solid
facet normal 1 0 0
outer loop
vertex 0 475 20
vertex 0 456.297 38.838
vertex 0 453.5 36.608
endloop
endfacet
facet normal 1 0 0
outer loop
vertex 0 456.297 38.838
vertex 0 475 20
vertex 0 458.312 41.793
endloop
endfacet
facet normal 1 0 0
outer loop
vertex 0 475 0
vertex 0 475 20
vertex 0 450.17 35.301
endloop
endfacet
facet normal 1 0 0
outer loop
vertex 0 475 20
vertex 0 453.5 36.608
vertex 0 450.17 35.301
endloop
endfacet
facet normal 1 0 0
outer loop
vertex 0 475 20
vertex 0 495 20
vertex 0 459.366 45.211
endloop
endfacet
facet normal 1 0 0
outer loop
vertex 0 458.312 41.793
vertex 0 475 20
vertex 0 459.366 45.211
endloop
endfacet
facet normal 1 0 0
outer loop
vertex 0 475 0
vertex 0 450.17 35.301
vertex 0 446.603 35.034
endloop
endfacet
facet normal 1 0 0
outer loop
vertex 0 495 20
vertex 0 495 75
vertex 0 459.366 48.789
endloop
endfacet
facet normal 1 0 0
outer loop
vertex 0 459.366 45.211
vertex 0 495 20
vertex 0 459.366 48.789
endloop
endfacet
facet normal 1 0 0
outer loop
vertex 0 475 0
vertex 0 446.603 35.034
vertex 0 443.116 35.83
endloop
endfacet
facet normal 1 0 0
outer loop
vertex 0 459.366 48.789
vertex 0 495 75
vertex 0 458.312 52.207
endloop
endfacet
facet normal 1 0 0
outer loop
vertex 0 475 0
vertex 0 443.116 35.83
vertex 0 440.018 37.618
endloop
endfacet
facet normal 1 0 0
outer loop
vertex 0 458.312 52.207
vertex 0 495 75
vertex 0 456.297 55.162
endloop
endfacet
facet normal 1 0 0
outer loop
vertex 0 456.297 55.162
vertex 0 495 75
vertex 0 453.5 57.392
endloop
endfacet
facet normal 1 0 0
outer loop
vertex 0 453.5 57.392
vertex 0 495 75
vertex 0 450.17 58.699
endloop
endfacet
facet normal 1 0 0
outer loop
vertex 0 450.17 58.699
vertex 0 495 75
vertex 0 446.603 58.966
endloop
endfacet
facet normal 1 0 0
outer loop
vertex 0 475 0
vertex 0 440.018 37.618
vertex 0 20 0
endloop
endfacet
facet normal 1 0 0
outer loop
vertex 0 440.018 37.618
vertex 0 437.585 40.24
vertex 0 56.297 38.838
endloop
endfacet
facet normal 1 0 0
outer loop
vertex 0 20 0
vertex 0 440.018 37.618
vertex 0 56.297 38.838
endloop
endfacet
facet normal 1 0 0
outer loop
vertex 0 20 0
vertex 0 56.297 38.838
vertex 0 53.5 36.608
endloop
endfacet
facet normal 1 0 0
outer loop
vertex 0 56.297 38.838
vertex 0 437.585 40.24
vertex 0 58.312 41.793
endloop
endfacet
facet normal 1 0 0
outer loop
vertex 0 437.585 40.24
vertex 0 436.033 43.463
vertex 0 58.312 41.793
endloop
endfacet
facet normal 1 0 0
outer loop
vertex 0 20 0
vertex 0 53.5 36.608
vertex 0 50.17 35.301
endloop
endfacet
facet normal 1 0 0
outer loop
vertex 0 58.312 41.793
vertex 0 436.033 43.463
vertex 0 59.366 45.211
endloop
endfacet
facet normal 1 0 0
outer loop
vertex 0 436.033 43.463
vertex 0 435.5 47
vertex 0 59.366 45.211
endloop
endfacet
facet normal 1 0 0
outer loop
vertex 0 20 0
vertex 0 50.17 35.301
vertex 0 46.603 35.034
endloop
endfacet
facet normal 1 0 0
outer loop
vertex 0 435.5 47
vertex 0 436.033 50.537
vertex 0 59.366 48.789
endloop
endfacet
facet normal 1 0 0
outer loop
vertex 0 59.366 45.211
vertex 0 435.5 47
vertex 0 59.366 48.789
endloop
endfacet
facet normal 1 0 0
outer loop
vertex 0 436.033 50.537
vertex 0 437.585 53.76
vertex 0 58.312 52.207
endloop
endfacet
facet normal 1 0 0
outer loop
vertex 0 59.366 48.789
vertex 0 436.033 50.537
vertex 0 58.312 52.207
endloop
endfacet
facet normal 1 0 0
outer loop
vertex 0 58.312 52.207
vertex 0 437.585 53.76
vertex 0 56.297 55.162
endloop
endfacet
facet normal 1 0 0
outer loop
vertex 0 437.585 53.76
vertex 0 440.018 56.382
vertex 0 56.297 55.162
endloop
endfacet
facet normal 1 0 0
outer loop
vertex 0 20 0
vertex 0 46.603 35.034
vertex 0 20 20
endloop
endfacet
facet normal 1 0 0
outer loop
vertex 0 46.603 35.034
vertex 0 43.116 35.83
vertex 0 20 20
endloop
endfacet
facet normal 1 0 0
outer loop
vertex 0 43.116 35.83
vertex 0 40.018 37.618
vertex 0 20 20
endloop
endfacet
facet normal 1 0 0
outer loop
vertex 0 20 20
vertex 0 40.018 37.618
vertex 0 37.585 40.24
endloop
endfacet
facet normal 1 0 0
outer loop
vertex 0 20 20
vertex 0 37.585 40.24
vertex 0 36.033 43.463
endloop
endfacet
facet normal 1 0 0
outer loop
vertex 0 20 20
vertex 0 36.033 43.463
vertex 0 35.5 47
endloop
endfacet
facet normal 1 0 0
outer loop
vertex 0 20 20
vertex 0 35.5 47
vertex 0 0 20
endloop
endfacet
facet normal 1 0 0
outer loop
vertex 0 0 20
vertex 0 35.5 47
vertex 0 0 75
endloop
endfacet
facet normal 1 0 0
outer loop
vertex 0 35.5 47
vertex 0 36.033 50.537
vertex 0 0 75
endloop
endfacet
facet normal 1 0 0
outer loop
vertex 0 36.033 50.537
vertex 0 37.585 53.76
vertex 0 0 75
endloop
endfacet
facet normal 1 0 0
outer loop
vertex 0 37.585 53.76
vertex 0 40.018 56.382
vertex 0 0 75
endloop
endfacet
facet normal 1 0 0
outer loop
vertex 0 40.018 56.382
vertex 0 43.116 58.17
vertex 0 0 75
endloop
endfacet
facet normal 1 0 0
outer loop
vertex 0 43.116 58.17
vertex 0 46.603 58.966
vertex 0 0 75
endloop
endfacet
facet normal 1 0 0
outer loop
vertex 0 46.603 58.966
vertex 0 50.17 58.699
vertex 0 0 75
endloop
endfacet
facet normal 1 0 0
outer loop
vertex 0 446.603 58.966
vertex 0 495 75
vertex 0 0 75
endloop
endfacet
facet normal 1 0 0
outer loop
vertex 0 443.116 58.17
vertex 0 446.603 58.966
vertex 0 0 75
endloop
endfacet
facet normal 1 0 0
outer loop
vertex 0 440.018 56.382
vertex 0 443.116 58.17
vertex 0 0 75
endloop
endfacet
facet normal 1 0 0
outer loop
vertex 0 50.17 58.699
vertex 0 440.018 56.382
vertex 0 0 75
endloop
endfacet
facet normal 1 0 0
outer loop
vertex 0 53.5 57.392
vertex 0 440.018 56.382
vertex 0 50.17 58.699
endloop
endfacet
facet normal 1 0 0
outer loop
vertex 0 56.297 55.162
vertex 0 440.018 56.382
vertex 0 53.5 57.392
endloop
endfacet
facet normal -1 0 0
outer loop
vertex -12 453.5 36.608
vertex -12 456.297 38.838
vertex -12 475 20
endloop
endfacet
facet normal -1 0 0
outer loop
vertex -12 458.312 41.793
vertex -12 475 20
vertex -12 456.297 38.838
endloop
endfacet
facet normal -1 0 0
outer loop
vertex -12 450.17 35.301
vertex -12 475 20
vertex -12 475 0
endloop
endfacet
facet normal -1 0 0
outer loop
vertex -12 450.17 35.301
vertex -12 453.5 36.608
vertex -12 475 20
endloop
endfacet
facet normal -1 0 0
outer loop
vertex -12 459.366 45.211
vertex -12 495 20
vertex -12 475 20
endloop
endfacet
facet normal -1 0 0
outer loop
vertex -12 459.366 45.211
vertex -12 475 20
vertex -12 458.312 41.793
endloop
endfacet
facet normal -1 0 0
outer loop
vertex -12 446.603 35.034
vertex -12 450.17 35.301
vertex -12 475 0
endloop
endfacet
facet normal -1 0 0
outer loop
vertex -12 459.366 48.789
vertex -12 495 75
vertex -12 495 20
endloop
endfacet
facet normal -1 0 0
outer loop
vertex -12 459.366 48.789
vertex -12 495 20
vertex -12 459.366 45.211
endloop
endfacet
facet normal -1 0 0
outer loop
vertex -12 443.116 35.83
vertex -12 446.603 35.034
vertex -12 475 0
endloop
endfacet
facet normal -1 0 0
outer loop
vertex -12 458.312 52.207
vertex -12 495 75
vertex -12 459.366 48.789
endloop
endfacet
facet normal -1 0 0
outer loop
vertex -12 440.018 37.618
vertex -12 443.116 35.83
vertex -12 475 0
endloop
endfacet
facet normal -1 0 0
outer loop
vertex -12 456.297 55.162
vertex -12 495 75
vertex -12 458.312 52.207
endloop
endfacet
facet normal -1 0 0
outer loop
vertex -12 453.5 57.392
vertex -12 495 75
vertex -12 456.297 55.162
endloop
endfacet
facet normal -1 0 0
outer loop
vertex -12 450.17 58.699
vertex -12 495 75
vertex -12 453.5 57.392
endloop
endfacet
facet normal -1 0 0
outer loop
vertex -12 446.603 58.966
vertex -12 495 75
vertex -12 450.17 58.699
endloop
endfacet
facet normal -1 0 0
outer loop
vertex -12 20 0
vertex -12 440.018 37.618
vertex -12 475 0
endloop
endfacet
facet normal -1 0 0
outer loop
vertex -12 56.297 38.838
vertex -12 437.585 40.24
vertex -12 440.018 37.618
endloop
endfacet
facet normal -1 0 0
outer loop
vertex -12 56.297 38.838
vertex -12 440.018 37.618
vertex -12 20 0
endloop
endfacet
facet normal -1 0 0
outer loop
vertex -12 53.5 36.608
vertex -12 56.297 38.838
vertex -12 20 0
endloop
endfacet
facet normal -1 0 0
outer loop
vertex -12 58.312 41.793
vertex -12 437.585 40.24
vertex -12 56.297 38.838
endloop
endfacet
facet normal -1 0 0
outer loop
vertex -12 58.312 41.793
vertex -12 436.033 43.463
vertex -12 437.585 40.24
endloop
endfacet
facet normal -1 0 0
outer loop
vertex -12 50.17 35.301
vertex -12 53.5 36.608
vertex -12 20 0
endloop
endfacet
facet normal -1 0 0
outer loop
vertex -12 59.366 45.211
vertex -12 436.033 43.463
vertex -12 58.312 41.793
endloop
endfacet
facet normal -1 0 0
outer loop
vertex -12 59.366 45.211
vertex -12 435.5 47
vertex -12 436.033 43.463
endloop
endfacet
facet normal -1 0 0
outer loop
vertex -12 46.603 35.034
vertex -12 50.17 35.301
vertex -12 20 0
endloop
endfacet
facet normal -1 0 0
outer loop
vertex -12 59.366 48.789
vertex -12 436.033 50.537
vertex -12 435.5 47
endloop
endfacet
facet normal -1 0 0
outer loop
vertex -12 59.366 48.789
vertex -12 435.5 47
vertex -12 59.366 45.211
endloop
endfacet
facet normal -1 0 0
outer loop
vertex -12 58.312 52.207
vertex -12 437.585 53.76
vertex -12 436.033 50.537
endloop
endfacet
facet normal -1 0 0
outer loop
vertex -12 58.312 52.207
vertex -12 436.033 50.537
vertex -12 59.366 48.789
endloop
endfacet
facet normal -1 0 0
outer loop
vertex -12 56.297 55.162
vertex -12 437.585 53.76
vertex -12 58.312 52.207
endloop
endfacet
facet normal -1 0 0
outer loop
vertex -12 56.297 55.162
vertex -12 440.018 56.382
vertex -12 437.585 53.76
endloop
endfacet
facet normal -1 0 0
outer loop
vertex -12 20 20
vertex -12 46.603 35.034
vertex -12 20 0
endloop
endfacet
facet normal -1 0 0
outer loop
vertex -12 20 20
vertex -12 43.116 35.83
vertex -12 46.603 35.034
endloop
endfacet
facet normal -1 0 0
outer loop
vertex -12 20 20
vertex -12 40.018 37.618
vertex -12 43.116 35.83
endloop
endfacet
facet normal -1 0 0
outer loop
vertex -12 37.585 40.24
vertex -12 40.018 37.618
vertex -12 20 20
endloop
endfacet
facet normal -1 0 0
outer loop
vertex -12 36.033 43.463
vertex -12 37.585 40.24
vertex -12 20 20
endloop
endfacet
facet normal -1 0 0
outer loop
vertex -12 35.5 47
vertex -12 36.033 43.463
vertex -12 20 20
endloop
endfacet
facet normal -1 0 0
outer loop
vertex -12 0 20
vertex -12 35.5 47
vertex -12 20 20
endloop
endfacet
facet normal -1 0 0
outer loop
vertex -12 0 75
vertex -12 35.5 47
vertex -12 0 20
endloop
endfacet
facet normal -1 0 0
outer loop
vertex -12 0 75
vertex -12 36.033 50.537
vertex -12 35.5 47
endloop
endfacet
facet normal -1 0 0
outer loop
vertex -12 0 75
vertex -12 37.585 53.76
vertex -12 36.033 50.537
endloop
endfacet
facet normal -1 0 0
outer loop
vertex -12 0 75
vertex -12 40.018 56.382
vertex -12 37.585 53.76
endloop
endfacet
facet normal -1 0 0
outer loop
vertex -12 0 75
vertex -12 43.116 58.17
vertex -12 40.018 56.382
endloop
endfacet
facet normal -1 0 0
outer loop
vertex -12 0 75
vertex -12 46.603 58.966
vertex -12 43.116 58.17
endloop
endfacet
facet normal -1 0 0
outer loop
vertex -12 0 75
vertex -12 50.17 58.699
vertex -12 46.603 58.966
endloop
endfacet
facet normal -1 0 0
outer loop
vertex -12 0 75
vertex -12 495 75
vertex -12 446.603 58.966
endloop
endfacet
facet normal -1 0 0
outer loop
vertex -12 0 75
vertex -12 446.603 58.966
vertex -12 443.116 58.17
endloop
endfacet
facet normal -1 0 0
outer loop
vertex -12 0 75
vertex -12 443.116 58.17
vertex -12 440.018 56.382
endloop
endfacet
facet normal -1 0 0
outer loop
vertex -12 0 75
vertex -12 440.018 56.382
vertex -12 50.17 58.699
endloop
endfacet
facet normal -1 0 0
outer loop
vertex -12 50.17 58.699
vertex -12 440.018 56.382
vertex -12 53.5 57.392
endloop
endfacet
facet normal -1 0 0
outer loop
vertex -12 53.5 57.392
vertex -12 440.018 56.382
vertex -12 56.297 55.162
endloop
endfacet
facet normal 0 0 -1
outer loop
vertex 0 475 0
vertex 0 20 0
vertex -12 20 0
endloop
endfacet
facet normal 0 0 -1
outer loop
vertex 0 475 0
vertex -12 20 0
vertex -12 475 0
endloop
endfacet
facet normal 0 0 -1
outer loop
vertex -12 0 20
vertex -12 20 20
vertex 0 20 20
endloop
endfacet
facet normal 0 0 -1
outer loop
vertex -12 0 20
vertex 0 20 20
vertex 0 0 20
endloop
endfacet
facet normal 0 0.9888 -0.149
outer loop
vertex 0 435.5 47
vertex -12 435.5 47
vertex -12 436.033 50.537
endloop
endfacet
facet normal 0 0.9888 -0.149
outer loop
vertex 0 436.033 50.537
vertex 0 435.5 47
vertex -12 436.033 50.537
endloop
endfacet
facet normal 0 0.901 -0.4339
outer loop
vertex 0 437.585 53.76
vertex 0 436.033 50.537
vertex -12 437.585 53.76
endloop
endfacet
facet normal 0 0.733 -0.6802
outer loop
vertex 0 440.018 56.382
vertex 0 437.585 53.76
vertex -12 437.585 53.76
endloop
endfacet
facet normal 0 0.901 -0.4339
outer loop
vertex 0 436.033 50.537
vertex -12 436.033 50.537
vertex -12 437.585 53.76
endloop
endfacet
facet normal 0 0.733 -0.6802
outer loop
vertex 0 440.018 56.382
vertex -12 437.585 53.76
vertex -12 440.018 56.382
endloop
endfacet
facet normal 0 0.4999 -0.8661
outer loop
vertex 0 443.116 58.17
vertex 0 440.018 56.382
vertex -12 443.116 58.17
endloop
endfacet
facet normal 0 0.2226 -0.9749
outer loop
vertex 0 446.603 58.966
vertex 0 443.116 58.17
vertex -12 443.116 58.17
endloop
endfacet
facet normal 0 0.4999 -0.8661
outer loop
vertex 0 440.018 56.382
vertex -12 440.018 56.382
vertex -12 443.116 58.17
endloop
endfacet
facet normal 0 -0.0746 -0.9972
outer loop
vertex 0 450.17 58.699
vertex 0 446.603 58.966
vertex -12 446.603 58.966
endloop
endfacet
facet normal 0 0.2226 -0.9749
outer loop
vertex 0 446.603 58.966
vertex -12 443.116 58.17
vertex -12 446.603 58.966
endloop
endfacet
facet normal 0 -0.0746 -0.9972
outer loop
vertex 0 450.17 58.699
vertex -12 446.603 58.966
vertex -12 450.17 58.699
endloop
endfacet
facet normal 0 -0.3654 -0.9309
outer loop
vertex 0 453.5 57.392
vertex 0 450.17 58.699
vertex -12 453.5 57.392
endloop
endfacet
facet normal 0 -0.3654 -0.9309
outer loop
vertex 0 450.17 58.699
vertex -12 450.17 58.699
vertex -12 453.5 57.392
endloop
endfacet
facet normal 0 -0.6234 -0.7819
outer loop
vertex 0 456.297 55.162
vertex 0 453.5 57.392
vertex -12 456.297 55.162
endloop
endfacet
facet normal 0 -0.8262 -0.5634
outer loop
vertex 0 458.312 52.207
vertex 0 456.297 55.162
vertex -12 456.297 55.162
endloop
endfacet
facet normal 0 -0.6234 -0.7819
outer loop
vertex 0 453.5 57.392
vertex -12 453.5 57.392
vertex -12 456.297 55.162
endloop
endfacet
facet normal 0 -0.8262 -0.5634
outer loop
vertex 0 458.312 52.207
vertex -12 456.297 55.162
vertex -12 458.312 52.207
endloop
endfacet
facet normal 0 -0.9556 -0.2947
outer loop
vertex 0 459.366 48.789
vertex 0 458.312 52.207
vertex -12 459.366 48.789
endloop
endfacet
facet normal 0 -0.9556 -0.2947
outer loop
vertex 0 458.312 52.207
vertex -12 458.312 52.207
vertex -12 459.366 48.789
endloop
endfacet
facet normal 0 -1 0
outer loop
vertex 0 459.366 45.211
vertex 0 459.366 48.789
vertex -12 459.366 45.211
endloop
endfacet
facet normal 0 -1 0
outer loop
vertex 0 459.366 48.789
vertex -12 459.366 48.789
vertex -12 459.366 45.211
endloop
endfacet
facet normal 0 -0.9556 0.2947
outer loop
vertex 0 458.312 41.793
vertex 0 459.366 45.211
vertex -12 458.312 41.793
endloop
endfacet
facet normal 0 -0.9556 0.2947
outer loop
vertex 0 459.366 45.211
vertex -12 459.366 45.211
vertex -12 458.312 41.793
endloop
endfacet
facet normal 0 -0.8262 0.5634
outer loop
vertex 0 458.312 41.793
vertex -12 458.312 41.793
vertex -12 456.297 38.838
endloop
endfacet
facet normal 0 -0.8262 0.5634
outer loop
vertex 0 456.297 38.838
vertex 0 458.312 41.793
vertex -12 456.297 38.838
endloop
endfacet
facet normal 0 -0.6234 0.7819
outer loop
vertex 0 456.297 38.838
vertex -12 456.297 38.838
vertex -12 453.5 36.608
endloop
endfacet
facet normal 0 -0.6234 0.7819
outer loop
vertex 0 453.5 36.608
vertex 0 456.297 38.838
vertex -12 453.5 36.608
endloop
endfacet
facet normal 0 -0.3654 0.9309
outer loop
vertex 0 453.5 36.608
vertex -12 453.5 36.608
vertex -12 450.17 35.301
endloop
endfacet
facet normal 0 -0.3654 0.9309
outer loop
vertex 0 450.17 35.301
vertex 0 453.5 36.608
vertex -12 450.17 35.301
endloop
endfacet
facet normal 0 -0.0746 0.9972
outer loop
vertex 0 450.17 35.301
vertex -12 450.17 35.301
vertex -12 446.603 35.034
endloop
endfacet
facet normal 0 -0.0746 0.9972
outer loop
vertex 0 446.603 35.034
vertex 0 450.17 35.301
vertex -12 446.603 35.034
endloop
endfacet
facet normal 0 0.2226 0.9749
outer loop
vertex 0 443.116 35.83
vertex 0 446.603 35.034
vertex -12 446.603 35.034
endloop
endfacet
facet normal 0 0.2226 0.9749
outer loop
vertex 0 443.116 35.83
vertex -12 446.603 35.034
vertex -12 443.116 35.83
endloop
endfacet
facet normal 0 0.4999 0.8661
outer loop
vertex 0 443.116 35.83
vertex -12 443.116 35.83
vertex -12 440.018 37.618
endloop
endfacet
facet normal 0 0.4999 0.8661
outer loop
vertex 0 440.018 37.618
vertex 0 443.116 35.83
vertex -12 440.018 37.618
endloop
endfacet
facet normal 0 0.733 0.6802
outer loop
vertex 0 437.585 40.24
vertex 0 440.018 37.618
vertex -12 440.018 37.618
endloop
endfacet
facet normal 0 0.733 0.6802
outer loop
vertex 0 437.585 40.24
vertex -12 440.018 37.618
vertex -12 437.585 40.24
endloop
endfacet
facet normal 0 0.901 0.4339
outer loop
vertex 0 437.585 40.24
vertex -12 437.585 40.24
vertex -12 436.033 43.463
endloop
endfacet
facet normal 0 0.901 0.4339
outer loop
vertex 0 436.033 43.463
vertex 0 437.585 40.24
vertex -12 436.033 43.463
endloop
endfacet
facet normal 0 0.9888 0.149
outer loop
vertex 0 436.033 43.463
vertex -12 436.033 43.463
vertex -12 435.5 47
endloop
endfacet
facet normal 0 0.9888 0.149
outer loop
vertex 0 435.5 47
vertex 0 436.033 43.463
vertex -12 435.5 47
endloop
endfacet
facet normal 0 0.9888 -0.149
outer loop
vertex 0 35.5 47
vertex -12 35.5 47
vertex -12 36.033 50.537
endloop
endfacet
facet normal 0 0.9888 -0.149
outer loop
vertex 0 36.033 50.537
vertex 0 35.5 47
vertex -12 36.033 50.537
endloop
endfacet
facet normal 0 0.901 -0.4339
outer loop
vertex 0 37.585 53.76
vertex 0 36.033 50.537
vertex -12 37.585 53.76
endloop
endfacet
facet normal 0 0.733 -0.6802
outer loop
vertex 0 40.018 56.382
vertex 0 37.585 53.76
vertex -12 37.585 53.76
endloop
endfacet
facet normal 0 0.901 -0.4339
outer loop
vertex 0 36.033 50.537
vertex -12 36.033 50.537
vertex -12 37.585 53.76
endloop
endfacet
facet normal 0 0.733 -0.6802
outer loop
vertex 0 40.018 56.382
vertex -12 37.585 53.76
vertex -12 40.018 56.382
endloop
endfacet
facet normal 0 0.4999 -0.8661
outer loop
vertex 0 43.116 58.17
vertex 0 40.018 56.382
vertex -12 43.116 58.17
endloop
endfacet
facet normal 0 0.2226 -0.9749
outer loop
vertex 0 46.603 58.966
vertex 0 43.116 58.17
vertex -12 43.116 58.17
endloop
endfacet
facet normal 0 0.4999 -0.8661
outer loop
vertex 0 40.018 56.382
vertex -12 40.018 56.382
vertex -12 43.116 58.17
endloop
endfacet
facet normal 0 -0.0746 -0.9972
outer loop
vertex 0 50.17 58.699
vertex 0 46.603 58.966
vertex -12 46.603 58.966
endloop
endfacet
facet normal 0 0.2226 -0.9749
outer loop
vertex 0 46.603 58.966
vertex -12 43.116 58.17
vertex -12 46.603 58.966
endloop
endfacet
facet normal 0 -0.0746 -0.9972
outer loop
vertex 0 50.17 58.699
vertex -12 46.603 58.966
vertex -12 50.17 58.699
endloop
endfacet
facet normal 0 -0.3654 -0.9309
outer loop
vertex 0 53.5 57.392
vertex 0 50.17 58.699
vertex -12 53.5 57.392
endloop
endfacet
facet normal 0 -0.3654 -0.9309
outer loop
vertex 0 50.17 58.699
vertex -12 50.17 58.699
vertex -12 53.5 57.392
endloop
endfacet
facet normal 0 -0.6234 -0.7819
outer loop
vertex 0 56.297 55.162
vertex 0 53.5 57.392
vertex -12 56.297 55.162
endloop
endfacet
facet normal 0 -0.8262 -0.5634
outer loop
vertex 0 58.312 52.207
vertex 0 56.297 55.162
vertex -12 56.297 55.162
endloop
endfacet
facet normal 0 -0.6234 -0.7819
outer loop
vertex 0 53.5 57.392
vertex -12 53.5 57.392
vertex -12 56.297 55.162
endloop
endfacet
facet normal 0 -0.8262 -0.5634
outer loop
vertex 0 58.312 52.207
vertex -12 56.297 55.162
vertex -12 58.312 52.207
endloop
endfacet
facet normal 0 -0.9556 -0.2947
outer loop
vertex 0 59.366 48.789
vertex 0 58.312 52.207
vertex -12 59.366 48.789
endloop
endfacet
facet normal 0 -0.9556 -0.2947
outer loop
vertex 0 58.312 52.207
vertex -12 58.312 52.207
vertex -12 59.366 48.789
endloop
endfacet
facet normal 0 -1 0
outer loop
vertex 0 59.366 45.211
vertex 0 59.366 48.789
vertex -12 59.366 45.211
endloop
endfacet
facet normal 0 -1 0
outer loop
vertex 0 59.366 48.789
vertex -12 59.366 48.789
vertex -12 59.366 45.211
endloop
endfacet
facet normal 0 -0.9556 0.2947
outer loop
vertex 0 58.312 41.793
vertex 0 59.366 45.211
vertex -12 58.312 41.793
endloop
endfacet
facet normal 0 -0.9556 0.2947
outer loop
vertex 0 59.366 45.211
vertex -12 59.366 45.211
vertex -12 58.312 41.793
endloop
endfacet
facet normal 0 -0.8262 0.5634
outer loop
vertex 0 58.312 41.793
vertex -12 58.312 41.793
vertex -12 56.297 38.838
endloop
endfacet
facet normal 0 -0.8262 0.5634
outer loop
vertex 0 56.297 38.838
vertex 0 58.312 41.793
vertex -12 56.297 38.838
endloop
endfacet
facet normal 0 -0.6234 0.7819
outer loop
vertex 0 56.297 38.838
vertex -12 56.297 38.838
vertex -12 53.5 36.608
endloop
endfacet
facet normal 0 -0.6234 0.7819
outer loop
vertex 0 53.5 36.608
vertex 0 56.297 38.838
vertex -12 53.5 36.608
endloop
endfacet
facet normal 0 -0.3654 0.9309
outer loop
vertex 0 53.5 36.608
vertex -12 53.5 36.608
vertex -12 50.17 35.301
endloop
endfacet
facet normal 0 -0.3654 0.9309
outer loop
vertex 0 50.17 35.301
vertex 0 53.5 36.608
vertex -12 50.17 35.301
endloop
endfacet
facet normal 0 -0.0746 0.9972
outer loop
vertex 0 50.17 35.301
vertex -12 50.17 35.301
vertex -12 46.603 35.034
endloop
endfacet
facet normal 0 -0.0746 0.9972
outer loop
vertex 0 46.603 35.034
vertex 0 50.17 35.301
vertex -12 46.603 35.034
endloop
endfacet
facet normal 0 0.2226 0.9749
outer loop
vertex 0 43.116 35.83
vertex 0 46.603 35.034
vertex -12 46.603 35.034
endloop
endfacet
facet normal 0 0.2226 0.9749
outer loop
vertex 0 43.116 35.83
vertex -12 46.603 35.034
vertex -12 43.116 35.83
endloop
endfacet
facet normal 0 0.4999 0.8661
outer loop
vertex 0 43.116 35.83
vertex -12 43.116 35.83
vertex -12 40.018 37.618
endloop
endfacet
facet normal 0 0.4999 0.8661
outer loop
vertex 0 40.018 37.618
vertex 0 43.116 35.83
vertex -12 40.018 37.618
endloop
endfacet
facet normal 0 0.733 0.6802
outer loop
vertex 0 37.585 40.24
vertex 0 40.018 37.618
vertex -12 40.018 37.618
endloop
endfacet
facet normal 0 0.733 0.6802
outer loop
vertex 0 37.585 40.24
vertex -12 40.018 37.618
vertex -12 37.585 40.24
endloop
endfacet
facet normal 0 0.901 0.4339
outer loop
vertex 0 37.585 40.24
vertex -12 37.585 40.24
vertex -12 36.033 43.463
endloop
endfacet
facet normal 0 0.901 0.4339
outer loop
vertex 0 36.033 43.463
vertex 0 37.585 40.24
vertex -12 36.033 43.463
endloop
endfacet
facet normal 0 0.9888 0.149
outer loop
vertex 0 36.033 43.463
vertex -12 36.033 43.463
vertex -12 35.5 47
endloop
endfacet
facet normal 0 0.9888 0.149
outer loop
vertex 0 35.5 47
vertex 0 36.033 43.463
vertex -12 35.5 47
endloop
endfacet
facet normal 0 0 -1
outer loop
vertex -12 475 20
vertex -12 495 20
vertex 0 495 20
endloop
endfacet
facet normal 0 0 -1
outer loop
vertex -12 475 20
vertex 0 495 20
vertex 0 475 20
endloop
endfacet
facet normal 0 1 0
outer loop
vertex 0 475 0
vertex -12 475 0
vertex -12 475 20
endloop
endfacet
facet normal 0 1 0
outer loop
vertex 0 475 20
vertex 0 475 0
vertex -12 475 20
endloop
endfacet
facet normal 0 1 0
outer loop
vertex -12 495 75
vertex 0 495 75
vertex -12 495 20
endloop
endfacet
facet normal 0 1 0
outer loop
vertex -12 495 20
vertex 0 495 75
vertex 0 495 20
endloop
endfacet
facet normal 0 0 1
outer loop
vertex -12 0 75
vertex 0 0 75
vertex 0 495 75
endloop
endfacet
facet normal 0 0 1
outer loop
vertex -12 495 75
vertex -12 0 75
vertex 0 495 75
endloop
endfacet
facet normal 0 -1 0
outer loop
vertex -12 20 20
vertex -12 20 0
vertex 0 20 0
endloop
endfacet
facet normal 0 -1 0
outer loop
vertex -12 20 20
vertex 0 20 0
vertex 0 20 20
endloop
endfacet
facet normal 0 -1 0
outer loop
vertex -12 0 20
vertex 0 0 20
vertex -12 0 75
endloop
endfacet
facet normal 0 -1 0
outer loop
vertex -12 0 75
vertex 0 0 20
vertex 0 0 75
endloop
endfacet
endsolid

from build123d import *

# Parameters (mm, degrees)
PAD_DEPTH    = 12
SKETCH001_R  = 12
SKETCH001_W  = 20
SKETCH001_H  = 20
POCKET_DEPTH = 20


with BuildPart() as part:
    # Sketch → Pad (new body)
    with BuildSketch(Plane.YZ):
        Polygon((0, 0), (0, 75), (495, 75), (495, 0), (247.5, 0), align=None)
    extrude(amount=-PAD_DEPTH)

    # Sketch001 (on Face7 of Pad) → Pocket (cut)
    with BuildSketch(Plane(origin=(-12, 0, 0), x_dir=(0, -1, 0), z_dir=(-1, 0, 0))):
        with Locations((-447.5, 47)):
            Circle(SKETCH001_R)
        with Locations((-47.5, 47)):
            Circle(SKETCH001_R)
        with Locations((-10, 10)):
            Rectangle(SKETCH001_W, SKETCH001_H)
        with Locations((-485, 10)):
            Rectangle(SKETCH001_W, SKETCH001_H)
    extrude(amount=-POCKET_DEPTH, mode=Mode.SUBTRACT)


solid = part.part
